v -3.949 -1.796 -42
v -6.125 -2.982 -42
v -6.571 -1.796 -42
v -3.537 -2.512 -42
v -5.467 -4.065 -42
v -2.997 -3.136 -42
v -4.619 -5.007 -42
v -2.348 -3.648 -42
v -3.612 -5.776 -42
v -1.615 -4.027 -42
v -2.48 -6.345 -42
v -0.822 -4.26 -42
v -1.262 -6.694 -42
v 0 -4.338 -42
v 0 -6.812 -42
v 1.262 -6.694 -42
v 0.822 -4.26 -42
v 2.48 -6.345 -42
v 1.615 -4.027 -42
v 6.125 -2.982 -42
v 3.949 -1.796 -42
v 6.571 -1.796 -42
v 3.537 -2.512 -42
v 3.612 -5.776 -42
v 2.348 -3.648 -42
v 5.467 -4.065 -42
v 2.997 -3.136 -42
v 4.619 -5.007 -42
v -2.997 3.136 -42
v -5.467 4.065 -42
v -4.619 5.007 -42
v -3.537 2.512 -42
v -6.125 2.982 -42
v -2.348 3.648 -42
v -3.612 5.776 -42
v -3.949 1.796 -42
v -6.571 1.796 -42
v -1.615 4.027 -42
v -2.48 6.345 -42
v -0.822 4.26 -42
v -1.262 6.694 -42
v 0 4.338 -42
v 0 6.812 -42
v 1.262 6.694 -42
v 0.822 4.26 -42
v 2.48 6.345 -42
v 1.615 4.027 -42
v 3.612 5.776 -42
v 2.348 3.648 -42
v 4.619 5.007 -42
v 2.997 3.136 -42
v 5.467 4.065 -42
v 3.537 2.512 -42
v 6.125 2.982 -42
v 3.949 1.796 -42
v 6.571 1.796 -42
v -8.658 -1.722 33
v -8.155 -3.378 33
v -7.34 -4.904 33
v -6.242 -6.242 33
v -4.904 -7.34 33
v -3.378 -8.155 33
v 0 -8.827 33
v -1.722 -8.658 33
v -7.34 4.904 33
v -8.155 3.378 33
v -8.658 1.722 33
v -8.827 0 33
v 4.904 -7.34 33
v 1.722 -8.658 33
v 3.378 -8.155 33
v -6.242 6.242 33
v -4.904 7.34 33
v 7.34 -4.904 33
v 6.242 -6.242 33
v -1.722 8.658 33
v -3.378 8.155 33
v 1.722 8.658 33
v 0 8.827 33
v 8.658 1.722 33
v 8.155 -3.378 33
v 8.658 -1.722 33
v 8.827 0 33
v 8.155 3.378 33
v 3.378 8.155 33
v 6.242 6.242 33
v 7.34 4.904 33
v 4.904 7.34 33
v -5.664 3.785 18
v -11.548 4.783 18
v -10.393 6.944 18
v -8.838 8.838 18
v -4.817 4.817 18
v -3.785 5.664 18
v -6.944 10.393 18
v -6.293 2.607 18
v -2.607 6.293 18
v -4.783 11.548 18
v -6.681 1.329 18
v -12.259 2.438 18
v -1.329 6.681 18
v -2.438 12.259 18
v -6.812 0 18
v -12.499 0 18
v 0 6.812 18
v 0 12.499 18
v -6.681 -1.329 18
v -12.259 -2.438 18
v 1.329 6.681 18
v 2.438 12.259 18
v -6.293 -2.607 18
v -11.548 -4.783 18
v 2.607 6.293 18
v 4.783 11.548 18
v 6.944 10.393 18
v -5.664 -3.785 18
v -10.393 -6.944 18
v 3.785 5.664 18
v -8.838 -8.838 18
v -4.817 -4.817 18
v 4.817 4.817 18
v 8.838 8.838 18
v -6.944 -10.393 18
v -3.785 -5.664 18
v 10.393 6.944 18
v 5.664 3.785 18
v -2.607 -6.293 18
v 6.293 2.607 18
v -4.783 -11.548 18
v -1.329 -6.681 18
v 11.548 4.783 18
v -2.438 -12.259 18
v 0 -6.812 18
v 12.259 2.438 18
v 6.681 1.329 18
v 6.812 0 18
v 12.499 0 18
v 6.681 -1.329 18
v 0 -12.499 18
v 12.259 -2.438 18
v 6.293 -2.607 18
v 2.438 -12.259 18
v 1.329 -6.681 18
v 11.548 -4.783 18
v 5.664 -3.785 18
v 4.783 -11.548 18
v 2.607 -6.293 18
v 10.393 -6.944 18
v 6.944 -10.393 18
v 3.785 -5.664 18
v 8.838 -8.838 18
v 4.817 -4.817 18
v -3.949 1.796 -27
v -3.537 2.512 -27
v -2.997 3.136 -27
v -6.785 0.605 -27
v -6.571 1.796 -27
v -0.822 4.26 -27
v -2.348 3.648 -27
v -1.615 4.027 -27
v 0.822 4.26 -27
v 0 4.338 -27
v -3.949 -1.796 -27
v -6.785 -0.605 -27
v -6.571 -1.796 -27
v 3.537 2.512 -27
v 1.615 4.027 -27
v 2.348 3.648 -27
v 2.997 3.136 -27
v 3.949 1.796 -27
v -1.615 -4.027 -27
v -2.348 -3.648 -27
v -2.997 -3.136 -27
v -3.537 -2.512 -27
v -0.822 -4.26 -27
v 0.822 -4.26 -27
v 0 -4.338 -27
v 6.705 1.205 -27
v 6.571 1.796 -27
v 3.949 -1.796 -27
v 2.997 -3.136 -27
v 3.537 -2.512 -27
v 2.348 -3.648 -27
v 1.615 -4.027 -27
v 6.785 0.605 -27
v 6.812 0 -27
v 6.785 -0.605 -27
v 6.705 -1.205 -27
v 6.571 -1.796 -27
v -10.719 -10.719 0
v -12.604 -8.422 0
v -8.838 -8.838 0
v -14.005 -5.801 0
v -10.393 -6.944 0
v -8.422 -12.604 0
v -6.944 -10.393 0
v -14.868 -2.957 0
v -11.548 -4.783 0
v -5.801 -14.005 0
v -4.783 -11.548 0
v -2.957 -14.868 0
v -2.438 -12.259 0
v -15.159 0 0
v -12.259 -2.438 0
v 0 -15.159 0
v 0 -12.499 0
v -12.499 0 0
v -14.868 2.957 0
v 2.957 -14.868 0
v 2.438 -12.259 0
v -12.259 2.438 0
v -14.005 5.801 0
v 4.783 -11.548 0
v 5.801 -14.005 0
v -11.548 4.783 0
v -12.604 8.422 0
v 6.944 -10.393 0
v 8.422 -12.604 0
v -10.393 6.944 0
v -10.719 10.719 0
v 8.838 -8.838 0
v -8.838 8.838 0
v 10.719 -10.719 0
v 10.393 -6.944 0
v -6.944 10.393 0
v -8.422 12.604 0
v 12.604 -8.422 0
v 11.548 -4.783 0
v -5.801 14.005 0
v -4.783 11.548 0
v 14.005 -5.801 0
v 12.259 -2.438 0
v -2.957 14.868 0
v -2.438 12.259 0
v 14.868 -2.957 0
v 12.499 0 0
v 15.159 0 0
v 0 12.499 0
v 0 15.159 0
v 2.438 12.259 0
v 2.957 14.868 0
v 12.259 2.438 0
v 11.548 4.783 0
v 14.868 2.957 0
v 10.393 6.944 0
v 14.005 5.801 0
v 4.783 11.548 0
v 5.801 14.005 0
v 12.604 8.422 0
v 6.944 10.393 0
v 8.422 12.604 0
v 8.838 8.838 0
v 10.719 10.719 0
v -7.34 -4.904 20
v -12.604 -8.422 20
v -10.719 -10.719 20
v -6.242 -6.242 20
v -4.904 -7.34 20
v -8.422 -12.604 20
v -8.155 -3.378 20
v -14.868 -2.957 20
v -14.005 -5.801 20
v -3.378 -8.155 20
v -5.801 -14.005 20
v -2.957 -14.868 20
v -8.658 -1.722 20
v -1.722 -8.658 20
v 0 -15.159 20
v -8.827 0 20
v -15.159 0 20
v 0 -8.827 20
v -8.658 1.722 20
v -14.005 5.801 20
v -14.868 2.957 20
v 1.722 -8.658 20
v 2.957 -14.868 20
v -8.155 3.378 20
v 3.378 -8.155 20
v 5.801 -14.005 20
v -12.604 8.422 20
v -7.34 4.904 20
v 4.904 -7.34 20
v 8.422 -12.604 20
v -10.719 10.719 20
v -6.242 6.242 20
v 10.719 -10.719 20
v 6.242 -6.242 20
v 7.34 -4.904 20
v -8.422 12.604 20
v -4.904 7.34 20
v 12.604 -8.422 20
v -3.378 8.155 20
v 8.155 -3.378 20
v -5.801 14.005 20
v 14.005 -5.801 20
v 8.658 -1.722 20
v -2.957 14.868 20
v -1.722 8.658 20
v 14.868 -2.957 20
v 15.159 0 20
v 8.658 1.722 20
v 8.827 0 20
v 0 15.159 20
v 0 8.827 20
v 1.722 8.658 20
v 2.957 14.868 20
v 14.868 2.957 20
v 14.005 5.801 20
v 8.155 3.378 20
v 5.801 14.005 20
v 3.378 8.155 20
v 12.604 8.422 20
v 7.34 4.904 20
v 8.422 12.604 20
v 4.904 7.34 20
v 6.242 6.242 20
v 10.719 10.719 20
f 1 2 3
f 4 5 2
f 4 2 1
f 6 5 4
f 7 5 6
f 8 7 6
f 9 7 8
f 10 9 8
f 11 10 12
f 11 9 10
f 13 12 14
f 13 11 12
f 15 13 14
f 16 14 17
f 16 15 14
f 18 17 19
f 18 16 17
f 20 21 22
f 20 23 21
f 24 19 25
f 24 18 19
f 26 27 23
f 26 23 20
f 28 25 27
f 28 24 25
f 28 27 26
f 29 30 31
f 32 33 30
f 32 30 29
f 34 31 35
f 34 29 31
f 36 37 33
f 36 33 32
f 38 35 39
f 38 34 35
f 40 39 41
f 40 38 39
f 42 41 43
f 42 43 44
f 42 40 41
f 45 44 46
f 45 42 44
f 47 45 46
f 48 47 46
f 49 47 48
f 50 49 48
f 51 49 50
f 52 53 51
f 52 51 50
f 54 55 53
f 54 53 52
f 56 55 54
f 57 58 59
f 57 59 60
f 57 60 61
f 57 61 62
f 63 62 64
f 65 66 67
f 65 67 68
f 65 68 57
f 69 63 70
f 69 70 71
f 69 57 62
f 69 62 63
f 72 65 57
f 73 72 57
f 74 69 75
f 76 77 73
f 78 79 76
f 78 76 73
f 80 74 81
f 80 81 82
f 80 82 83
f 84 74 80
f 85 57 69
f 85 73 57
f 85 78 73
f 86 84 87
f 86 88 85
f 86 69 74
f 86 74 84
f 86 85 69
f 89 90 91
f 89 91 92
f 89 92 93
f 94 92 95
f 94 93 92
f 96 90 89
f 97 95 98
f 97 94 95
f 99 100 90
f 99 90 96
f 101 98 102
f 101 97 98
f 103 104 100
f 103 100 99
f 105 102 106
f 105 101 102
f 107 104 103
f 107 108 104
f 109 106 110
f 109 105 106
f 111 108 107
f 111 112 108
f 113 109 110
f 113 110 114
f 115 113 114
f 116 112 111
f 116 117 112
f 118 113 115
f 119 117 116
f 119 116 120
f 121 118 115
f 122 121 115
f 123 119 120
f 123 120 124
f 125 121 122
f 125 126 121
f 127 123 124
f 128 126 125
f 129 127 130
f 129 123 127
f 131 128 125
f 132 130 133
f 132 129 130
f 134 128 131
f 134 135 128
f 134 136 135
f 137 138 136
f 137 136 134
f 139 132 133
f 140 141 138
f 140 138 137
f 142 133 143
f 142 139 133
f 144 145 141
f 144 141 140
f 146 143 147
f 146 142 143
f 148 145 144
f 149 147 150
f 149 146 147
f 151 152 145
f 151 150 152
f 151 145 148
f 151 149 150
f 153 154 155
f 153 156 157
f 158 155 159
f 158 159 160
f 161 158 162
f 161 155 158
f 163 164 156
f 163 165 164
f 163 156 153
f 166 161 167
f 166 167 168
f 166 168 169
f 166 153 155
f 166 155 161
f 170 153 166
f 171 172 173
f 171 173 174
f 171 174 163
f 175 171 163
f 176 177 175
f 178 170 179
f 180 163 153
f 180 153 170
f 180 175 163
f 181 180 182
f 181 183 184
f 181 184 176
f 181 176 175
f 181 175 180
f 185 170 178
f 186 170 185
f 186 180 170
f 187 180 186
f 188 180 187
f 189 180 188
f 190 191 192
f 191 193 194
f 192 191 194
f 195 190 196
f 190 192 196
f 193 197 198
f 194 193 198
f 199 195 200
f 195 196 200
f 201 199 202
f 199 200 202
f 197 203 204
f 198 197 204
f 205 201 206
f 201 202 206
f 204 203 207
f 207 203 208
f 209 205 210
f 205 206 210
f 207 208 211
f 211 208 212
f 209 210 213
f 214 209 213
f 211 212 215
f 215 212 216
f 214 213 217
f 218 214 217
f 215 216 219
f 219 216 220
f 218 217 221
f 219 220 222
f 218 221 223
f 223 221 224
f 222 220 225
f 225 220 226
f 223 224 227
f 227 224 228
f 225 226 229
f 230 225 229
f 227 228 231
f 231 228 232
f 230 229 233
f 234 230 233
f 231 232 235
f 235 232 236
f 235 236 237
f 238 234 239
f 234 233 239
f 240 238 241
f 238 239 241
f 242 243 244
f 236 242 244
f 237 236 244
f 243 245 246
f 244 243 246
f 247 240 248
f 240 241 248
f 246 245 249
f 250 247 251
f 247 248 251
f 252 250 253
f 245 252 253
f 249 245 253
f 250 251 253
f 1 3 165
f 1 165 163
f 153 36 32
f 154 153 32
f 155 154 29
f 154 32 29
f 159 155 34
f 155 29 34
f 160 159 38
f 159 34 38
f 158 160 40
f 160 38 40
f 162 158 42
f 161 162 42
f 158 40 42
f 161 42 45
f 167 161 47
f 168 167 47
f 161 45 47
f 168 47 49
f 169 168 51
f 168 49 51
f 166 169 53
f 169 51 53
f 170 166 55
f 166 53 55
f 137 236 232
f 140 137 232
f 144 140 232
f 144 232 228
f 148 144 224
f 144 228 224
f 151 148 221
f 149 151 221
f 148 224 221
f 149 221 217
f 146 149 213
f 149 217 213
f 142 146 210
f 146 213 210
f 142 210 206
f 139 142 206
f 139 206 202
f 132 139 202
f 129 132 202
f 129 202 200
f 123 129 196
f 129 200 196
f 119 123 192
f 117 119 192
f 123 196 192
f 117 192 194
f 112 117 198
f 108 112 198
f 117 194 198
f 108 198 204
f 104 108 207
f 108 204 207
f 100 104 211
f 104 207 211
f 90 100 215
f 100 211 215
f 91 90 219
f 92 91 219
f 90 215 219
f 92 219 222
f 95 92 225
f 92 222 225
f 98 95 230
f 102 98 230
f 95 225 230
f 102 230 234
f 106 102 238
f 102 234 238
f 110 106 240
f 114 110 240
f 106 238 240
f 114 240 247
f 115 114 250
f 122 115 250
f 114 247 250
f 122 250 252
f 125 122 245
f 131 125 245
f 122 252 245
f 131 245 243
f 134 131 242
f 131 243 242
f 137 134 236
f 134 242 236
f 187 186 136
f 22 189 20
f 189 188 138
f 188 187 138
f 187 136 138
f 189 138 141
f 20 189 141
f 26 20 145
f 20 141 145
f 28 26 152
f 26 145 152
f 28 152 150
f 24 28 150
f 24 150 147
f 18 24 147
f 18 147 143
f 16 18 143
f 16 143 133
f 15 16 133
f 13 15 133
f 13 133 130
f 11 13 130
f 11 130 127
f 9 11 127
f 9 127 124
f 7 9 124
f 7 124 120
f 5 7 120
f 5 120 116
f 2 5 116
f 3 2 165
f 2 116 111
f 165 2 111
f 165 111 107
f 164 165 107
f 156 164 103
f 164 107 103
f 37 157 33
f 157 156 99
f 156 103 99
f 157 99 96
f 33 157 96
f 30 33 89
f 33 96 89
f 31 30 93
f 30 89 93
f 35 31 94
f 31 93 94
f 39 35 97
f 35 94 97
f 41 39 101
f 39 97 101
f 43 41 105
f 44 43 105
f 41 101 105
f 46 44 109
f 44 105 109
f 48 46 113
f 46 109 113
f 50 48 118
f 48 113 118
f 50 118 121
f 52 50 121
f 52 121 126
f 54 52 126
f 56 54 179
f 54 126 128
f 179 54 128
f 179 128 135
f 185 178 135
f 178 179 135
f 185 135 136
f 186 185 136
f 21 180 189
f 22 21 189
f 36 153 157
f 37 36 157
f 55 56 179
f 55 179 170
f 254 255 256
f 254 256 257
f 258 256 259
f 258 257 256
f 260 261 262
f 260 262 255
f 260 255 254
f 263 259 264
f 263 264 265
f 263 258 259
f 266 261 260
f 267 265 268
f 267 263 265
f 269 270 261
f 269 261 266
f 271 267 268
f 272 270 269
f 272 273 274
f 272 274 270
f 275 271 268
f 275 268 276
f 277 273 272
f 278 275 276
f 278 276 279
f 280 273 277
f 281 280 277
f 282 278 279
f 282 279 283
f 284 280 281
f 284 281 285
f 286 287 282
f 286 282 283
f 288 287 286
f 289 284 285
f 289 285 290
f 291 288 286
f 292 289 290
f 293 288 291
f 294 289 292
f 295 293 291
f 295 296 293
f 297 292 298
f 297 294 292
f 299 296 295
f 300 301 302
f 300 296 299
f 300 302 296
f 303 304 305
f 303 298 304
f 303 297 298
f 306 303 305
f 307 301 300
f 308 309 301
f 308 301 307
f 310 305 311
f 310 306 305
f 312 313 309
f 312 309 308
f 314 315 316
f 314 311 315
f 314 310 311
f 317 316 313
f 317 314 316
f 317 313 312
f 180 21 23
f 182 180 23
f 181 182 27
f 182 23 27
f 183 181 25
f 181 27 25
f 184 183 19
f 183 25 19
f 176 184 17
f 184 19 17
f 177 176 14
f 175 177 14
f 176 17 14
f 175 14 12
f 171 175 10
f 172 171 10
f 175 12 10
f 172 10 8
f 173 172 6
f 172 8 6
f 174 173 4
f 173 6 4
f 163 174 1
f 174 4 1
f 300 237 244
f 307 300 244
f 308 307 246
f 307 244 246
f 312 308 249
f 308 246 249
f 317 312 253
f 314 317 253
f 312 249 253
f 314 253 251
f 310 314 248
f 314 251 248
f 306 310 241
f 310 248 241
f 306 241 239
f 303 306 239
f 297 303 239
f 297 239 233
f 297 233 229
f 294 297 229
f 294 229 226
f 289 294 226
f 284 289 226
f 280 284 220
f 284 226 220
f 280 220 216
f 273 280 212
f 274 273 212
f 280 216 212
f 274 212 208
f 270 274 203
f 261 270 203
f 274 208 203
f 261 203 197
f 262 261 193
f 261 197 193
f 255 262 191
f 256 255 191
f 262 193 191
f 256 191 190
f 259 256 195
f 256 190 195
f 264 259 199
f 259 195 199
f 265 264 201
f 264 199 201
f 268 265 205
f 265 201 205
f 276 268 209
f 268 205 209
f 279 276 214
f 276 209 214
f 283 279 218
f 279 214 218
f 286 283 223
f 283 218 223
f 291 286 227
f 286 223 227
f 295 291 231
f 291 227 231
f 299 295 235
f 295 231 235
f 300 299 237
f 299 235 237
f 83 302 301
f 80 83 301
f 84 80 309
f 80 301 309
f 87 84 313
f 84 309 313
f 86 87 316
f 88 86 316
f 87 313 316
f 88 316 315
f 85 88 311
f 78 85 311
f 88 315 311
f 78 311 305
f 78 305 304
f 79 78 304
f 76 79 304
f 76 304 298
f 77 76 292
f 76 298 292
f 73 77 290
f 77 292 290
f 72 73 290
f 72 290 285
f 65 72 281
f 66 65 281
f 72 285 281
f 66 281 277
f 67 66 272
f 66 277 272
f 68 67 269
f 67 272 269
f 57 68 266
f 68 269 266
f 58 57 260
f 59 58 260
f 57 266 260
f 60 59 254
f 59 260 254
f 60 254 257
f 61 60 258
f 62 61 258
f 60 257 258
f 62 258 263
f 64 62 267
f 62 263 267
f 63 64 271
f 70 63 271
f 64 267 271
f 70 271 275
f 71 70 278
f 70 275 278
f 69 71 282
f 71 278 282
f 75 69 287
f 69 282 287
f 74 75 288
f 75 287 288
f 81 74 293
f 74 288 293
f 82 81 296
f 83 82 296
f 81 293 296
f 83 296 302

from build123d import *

# Parameters (mm, degrees)
SKETCH_R        = 15.159247
PAD_DEPTH       = 20
SKETCH001_R     = 8.82727
PAD001_DEPTH    = 13
SKETCH002_R     = 12.499133
POCKET_DEPTH    = 18
SKETCH003_R     = 6.812024
PAD002_DEPTH    = 60
POCKET001_DEPTH = 15


with BuildPart() as part:
    # Sketch → Pad (new body)
    with BuildSketch(Plane.XY):
        Circle(SKETCH_R)
    extrude(amount=PAD_DEPTH)

    # Sketch001 (on Face3 of Pad) → Pad001 (join)
    with BuildSketch(Plane.XY.offset(20)):
        Circle(SKETCH001_R)
    extrude(amount=PAD001_DEPTH)

    # Sketch002 (on Face2 of Pad001) → Pocket (cut)
    with BuildSketch(Plane(origin=(0, 0, 0), x_dir=(1, 0, 0), z_dir=(0, 0, -1))):
        Circle(SKETCH002_R)
    extrude(amount=-POCKET_DEPTH, mode=Mode.SUBTRACT)

    # Sketch003 (on Face6 of Pocket) → Pad002 (join)
    with BuildSketch(Plane(origin=(0, 0, 18), x_dir=(1, 0, 0), z_dir=(0, 0, -1))):
        Circle(SKETCH003_R)
    extrude(amount=PAD002_DEPTH)

    # Sketch004 (on Face9 of Pad002) → Pocket001 (cut)
    with BuildSketch(Plane(origin=(0, 0, -42), x_dir=(1, 0, 0), z_dir=(0, 0, -1))):
        with BuildLine():
            ThreePointArc((-3.949093, -1.795721), (0, -4.338197), (3.949093, -1.795721))
            Line((9.103818, -1.795721), (3.949093, -1.795721))
            Line((9.103818, 1.795721), (9.103818, -1.795721))
            Line((3.949093, 1.795721), (9.103818, 1.795721))
            ThreePointArc((3.949093, 1.795721), (0, 4.338197), (-3.949093, 1.795721))
            Line((-9.103818, 1.795721), (-3.949093, 1.795721))
            Line((-9.103818, -1.795721), (-9.103818, 1.795721))
            Line((-3.949093, -1.795721), (-9.103818, -1.795721))
        make_face()
    extrude(amount=-POCKET001_DEPTH, mode=Mode.SUBTRACT)


solid = part.part
